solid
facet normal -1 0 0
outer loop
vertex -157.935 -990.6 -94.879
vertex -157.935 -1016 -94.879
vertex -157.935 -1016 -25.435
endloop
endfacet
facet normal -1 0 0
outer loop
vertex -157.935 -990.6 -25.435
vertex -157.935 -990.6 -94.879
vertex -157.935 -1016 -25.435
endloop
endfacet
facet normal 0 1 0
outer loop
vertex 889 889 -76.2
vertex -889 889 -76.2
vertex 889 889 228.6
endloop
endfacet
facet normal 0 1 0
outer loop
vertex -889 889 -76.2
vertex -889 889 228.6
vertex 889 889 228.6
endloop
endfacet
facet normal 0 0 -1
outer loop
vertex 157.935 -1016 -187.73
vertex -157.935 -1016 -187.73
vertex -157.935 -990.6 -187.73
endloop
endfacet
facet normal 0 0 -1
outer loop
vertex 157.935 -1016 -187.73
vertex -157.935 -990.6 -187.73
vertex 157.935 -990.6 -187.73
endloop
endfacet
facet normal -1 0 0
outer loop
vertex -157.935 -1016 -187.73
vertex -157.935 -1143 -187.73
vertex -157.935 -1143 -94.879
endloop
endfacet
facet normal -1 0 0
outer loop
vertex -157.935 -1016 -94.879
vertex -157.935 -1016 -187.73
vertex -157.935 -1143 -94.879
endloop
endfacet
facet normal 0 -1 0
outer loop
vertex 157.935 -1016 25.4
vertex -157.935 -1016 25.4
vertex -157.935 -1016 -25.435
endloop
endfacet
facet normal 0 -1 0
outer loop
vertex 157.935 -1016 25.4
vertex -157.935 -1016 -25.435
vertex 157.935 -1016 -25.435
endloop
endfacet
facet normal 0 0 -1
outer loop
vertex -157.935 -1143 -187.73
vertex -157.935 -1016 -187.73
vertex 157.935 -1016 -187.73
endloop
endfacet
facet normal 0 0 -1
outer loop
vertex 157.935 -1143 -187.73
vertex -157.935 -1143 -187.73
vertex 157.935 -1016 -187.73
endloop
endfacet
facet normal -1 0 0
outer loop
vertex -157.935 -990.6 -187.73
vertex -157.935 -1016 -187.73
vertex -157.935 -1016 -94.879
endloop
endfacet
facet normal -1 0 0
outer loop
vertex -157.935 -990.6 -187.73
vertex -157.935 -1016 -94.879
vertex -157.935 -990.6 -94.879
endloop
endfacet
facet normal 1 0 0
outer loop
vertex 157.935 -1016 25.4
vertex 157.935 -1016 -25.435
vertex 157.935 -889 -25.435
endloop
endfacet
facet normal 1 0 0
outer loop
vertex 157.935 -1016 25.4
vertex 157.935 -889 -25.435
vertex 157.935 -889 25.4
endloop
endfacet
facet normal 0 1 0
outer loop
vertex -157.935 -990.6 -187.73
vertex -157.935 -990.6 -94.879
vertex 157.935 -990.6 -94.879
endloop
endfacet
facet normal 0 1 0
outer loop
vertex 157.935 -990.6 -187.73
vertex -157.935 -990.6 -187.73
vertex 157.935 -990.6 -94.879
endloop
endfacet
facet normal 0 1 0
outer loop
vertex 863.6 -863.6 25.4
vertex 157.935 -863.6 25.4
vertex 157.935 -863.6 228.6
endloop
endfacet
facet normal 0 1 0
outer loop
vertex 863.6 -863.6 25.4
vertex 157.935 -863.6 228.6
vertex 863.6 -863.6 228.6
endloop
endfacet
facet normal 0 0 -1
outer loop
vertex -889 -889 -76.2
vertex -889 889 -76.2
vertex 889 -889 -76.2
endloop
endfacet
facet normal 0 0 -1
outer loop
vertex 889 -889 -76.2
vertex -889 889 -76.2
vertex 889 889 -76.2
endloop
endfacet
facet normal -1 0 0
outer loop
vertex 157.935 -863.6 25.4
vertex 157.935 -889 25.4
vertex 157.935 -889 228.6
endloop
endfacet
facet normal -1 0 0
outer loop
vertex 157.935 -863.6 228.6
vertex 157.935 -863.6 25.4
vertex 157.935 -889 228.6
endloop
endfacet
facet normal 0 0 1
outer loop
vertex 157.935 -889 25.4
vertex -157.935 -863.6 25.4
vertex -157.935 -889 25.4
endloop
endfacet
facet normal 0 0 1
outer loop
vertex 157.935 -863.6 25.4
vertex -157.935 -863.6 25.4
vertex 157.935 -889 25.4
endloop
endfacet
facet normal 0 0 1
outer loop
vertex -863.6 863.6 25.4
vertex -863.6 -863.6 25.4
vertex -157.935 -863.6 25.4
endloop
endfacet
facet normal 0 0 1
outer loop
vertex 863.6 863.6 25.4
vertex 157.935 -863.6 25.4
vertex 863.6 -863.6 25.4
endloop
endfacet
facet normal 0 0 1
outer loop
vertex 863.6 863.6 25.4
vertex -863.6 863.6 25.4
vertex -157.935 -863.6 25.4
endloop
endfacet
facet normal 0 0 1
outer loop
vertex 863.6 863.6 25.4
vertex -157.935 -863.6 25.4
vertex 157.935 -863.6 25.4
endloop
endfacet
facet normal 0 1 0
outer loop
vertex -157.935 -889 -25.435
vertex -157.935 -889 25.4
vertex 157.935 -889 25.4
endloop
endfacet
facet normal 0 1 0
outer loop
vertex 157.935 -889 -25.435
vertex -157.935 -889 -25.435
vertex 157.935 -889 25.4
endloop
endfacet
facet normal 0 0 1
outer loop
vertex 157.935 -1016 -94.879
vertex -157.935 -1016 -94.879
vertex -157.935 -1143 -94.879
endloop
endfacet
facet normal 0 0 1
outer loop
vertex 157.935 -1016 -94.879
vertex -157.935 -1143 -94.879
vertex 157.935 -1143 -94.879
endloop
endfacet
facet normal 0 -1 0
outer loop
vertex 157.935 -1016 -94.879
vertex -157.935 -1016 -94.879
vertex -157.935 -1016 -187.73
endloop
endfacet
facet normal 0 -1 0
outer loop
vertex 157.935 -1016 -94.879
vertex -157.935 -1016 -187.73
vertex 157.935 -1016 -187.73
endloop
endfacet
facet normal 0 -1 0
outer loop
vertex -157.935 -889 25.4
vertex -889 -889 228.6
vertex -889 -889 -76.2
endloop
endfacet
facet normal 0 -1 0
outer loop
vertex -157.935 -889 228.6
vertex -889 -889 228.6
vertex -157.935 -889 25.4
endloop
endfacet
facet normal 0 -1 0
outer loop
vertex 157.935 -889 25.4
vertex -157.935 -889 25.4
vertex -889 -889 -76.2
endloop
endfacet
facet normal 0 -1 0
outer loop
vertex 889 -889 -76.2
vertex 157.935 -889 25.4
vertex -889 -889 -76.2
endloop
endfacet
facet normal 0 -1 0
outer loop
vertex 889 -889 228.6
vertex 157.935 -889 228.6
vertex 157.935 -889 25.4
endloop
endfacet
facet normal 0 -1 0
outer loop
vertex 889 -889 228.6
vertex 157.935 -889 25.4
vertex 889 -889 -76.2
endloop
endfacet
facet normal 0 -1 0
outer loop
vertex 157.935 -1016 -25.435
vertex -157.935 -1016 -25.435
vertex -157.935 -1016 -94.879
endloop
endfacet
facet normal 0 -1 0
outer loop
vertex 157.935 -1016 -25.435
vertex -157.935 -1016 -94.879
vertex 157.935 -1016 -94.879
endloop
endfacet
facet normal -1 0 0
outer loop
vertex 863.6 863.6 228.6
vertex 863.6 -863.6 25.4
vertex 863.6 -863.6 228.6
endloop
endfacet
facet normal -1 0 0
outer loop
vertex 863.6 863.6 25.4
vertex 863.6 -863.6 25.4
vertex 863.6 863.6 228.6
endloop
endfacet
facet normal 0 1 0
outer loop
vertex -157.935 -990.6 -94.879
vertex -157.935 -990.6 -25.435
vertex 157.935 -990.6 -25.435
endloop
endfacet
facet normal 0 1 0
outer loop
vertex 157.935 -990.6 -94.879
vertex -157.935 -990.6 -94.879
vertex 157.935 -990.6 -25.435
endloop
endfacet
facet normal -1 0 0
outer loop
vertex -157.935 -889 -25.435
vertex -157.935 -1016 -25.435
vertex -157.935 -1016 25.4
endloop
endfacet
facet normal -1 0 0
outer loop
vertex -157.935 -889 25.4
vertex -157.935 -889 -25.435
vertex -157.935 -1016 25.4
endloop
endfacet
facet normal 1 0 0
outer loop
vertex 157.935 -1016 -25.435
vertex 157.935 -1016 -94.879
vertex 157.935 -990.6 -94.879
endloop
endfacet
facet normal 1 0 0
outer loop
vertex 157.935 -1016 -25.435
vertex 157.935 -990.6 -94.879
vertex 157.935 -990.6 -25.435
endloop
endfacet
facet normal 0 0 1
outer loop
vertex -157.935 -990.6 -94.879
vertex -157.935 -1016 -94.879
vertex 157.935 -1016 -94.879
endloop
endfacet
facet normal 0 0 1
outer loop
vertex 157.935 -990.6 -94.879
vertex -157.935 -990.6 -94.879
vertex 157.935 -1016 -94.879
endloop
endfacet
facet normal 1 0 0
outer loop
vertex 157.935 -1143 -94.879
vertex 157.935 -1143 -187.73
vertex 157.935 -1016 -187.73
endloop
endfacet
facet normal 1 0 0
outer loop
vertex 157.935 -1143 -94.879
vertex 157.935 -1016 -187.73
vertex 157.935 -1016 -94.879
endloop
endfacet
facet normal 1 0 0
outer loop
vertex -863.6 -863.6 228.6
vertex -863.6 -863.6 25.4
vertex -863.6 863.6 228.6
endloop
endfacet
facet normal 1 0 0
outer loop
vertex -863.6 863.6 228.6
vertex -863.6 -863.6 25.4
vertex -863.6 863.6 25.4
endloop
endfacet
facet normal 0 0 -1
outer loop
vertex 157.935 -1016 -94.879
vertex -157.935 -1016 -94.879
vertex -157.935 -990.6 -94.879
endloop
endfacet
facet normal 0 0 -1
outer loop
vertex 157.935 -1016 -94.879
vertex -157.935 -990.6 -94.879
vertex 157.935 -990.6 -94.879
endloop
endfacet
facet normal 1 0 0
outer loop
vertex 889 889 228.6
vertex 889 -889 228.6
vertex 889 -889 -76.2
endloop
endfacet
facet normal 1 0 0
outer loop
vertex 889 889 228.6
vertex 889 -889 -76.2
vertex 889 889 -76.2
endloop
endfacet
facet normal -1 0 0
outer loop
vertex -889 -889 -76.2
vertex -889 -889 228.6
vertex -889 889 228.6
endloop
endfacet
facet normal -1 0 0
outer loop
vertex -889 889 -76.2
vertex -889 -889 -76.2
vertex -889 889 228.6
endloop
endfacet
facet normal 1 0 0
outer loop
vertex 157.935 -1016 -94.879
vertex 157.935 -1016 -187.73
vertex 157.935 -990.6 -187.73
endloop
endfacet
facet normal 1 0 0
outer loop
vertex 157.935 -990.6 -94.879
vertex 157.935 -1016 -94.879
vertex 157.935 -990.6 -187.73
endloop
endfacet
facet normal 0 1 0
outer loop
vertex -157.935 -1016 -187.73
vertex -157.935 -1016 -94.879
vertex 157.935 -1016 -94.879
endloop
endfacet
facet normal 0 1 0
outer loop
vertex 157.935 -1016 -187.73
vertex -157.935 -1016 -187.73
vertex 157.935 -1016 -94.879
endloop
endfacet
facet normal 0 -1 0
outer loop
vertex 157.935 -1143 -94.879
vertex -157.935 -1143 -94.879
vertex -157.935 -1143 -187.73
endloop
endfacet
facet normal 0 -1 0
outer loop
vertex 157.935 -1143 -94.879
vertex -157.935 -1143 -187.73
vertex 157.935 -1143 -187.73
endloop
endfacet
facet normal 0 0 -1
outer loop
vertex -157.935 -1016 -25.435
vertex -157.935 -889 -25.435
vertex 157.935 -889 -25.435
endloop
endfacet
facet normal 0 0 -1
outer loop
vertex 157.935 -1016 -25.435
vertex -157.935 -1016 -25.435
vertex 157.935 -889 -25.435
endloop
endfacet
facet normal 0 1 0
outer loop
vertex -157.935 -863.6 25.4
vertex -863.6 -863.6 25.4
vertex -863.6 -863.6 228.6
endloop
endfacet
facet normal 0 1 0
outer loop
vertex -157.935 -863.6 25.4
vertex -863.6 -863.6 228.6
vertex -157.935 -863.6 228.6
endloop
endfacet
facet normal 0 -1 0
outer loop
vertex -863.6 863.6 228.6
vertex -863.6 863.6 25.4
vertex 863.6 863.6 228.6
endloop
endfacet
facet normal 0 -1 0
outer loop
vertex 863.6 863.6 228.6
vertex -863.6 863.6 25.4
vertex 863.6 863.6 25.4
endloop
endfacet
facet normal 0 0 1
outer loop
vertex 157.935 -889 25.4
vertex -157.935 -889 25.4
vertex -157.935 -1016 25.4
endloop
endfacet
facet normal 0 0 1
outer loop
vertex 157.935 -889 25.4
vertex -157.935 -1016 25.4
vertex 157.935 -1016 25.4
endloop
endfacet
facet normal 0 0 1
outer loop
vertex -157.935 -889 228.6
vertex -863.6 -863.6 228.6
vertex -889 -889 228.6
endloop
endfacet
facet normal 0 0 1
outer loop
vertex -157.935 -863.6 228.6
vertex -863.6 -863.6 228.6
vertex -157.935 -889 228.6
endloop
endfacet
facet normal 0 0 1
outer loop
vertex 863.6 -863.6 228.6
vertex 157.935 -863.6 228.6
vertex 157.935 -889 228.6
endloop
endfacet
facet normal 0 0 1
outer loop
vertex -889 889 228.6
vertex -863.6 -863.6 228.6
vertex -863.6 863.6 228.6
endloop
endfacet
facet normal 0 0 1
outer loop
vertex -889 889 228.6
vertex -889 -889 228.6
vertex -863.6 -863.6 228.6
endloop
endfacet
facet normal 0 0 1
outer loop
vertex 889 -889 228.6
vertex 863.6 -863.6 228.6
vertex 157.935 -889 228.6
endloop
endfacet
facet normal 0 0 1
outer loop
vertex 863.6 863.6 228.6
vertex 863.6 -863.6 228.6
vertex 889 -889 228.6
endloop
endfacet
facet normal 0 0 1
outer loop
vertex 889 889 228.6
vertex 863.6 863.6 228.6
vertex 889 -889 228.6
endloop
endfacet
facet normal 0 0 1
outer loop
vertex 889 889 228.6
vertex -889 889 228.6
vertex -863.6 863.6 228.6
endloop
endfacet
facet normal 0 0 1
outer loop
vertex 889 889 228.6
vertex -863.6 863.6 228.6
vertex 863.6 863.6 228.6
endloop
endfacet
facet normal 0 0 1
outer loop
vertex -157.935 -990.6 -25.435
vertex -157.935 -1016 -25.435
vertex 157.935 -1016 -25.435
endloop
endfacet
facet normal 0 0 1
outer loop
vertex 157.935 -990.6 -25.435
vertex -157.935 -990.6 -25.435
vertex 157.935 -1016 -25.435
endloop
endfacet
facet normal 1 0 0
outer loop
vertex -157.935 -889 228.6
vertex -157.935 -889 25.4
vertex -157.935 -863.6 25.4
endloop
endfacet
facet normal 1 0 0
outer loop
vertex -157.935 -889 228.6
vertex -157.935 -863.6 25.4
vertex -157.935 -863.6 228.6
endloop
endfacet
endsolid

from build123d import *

# Parameters (mm, degrees)
F0_W      = 1778
F0_H      = 1778
F1_DEPTH  = 25.4
F2_W      = 1778
F2_H      = 1778
F2_W_2    = 1727.2
F2_H_2    = 1727.2
F3_DEPTH  = 203.2
F4_W      = 315.869897604
F4_H      = 203.2
F5_DEPTH  = 25.4
F7_DEPTH  = 76.2
F8_W      = 315.869897604
F8_H      = 50.8347044975
F9_DEPTH  = 127
F10_W     = 315.869897604
F10_H     = 69.4447364658
F11_DEPTH = 25.4
F12_W     = 315.869897604
F12_H     = 92.8507968783
F13_DEPTH = 127
F16_DEPTH = 92.8507968783


with BuildPart() as f1:
    # F0 (on Top) → F1 (new body)
    with BuildSketch(Plane.XY):
        Rectangle(F0_W, F0_H)
    extrude(amount=F1_DEPTH)


with BuildPart() as f3:
    # F2 (on face) → F3 (new body)
    with BuildSketch(Plane.XY.offset(25.4)):
        Rectangle(F2_W, F2_H)
        Rectangle(F2_W_2, F2_H_2, mode=Mode.SUBTRACT)
    extrude(amount=F3_DEPTH)

    # F4 (on face) → F5 (cut)
    with BuildSketch(Plane.XZ.offset(889)):
        with Locations((0, 127)):
            Rectangle(F4_W, F4_H)
    extrude(amount=-F5_DEPTH, mode=Mode.SUBTRACT)


with BuildPart() as f1_1:
    add(f1.part)

    # F6: union F3
    add(f3.part)

    # F7 (add): a face of the model
    f7_faces = [f1_1.faces().sort_by_distance(p)[0] for p in [
        (0, 0, 0),
    ]]
    extrude(f7_faces, amount=F7_DEPTH)


with BuildPart() as f9:
    # F8 (on face) → F9 (new body)
    with BuildSketch(Plane.XZ.offset(889)):
        with Locations((0, -0.0173522487)):
            Rectangle(F8_W, F8_H)
    extrude(amount=F9_DEPTH)


with BuildPart() as f11:
    # F10 (on face) → F11 (new body)
    with BuildSketch(Plane.XZ.offset(1016)):
        with Locations((0, -60.1570727304)):
            Rectangle(F10_W, F10_H)
    extrude(amount=-F11_DEPTH)


with BuildPart() as f13:
    # F12 (on face) → F13 (new body)
    with BuildSketch(Plane.XZ.offset(1016)):
        with Locations((0, -141.3048394024)):
            Rectangle(F12_W, F12_H)
    extrude(amount=F13_DEPTH)


with BuildPart() as f16:
    # F16 (new, through all): a face of the model
    f16_faces = [f11.part.faces().sort_by_distance(p)[0] for p in [
        (0, -1003.3, -94.8794409633),
    ]]
    extrude(f16_faces, amount=F16_DEPTH)


solid = Compound([f1_1.part, f9.part, f11.part, f13.part, f16.part])
